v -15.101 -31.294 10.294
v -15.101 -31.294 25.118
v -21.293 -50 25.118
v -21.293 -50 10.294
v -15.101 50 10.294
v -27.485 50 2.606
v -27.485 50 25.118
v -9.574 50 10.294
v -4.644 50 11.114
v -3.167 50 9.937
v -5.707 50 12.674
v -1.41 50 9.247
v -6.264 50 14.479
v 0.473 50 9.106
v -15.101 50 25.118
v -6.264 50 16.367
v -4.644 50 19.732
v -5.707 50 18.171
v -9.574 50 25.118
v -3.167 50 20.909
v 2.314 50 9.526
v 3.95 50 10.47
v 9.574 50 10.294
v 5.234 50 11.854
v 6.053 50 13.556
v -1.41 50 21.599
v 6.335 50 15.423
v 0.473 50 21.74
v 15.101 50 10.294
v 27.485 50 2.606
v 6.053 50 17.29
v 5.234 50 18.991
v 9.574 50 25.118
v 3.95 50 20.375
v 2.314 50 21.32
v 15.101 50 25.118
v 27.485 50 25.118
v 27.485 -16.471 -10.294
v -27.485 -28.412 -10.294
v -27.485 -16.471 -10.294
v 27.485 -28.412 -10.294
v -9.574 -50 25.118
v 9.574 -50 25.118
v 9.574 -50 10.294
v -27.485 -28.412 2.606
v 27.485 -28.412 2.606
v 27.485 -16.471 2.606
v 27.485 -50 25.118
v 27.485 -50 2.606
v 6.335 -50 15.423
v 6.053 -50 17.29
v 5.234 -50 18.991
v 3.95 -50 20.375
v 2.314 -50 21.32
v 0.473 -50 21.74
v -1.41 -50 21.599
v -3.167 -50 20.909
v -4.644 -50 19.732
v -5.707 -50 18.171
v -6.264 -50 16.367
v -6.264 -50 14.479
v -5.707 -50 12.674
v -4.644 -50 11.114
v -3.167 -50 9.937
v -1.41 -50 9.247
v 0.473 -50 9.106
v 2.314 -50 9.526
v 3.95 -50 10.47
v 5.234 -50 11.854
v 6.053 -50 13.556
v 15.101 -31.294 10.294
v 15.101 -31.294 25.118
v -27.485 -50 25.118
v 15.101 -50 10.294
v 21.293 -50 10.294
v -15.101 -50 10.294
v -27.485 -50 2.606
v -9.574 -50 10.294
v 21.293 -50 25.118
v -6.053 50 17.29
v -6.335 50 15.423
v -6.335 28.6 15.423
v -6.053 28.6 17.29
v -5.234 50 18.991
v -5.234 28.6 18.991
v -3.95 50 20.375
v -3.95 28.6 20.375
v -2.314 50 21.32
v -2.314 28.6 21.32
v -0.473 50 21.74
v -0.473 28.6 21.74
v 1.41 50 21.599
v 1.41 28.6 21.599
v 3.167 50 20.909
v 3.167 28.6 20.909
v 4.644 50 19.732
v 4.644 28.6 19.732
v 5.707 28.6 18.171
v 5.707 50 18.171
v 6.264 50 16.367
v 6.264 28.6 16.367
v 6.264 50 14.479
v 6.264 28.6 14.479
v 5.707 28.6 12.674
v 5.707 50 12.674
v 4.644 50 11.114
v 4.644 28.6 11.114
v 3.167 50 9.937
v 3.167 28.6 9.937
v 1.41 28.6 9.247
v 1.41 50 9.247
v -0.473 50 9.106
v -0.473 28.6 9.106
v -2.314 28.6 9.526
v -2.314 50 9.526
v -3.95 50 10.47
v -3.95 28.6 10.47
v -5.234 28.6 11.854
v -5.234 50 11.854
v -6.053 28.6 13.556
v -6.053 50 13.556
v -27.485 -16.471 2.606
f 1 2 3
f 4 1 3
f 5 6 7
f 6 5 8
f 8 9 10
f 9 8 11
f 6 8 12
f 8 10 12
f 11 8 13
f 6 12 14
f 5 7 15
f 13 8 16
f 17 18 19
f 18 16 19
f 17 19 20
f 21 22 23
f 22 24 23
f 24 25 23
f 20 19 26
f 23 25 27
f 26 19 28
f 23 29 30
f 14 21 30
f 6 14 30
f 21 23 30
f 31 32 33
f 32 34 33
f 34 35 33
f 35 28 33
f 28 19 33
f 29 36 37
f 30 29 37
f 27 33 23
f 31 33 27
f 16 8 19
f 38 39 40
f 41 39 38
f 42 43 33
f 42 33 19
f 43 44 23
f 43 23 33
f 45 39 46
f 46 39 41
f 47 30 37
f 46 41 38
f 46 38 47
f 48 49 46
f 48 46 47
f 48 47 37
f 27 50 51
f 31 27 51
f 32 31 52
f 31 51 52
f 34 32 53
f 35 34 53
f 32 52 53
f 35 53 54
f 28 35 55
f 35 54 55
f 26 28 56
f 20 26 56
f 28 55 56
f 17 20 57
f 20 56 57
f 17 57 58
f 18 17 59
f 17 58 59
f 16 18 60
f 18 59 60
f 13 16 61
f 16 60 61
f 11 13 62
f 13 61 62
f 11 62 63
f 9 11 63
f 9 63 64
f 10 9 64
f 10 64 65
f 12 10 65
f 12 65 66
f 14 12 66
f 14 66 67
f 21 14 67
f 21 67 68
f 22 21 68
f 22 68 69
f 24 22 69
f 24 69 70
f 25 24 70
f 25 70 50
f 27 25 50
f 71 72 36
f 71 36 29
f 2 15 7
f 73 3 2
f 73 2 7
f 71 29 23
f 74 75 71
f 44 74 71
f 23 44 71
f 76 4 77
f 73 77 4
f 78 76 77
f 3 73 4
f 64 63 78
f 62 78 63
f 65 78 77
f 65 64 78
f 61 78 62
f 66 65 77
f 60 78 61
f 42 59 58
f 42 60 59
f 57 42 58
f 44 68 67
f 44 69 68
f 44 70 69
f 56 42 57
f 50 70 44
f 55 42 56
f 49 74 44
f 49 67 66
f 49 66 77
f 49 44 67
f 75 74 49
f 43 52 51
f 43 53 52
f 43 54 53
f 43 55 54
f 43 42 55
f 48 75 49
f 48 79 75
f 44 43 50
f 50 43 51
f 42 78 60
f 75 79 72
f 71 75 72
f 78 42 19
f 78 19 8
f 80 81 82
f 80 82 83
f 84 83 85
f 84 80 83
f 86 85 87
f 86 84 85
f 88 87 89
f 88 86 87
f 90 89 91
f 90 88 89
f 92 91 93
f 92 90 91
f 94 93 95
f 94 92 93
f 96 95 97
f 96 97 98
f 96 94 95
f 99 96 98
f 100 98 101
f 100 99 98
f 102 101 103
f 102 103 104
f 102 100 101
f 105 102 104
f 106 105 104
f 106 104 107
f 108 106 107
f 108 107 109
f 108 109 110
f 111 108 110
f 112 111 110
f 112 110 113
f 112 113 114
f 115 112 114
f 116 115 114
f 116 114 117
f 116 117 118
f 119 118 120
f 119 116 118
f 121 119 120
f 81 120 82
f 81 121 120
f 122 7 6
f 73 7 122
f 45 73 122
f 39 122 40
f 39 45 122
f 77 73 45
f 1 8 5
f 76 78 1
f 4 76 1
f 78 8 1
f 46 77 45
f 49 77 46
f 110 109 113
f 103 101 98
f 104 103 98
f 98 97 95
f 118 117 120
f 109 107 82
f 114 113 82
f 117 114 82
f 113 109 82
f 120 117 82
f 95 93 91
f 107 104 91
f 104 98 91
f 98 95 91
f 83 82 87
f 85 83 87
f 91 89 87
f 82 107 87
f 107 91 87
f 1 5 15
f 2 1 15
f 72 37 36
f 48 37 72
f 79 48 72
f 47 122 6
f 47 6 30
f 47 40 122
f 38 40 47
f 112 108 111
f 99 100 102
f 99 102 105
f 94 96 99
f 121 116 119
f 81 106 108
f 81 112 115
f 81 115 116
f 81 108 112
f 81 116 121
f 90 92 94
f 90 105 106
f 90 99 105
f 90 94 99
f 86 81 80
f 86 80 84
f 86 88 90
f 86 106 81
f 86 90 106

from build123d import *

# Parameters (mm, degrees)
F1_DEPTH = 50
F2_W     = 54.9705848098
F2_H     = 21.5882334858
F2_H_2   = 66.4705887437
F3_DEPTH = 12.9
F5_DEPTH = 14.8235308006
F6_R     = 6.3346465425
F7_DEPTH = 114.6
F8_R     = 6.3346465425
F9_DEPTH = 21.4


with BuildPart() as f1:
    # F0 (on Front) → F1 (new body, symmetric)
    with BuildSketch(Plane.XZ):
        Polygon((15.1010118425, 25.1176496968), (15.1010118425, 10.2941188961), (9.5735294744, 10.2941188961), (9.5735294744, 25.1176496968), (-9.5735294744, 25.1176496968), (-9.5735294744, 10.2941188961), (-15.1010118425, 10.2941188961), (-15.1010118425, 25.1176496968), (-27.4852924049, 25.1176496968), (-27.4852924049, 10.2941188961), (-27.4852924049, -10.2941188961), (-15.1010118425, -10.2941188961), (27.4852924049, -10.2941188961), (27.4852924049, 10.2941188961), (27.4852924049, 25.1176496968), align=None)
    extrude(amount=F1_DEPTH, both=True)

    # F2 (on face) → F3 (cut)
    with BuildSketch(Plane(origin=(0, 0, -10.2941188961), x_dir=(1, 0, 0), z_dir=(0, 0, -1))):
        with Locations((0, 39.2058832571)):
            Rectangle(F2_W, F2_H)
        with Locations((0, -16.7647056282)):
            Rectangle(F2_W, F2_H_2)
    extrude(amount=-F3_DEPTH, mode=Mode.SUBTRACT)

    # F4 (on face) → F5 (cut, through all)
    with BuildSketch(Plane.XY.offset(25.1176496968)):
        Polygon((-15.1010118425, -31.294118613), (-21.2931521237, -50), (-15.1010118425, -50), align=None)
        Polygon((15.1010118425, -50), (21.2931521237, -50), (15.1010118425, -31.294118613), align=None)
    extrude(amount=-F5_DEPTH, mode=Mode.SUBTRACT)

    # F6 (on face) → F7 (cut)
    with BuildSketch(Plane.XZ.offset(50)):
        with Locations((0, 15.4228592291)):
            Circle(F6_R)
    extrude(amount=-F7_DEPTH, mode=Mode.SUBTRACT)


with BuildPart() as f9:
    # F8 (on face) → F9 (new body)
    with BuildSketch(Plane(origin=(0, 50, 0), x_dir=(-1, 0, 0), z_dir=(0, 1, 0))):
        with Locations((0, 15.4228592291)):
            Circle(F8_R)
    extrude(amount=-F9_DEPTH)


solid = Compound([f1.part, f9.part])
